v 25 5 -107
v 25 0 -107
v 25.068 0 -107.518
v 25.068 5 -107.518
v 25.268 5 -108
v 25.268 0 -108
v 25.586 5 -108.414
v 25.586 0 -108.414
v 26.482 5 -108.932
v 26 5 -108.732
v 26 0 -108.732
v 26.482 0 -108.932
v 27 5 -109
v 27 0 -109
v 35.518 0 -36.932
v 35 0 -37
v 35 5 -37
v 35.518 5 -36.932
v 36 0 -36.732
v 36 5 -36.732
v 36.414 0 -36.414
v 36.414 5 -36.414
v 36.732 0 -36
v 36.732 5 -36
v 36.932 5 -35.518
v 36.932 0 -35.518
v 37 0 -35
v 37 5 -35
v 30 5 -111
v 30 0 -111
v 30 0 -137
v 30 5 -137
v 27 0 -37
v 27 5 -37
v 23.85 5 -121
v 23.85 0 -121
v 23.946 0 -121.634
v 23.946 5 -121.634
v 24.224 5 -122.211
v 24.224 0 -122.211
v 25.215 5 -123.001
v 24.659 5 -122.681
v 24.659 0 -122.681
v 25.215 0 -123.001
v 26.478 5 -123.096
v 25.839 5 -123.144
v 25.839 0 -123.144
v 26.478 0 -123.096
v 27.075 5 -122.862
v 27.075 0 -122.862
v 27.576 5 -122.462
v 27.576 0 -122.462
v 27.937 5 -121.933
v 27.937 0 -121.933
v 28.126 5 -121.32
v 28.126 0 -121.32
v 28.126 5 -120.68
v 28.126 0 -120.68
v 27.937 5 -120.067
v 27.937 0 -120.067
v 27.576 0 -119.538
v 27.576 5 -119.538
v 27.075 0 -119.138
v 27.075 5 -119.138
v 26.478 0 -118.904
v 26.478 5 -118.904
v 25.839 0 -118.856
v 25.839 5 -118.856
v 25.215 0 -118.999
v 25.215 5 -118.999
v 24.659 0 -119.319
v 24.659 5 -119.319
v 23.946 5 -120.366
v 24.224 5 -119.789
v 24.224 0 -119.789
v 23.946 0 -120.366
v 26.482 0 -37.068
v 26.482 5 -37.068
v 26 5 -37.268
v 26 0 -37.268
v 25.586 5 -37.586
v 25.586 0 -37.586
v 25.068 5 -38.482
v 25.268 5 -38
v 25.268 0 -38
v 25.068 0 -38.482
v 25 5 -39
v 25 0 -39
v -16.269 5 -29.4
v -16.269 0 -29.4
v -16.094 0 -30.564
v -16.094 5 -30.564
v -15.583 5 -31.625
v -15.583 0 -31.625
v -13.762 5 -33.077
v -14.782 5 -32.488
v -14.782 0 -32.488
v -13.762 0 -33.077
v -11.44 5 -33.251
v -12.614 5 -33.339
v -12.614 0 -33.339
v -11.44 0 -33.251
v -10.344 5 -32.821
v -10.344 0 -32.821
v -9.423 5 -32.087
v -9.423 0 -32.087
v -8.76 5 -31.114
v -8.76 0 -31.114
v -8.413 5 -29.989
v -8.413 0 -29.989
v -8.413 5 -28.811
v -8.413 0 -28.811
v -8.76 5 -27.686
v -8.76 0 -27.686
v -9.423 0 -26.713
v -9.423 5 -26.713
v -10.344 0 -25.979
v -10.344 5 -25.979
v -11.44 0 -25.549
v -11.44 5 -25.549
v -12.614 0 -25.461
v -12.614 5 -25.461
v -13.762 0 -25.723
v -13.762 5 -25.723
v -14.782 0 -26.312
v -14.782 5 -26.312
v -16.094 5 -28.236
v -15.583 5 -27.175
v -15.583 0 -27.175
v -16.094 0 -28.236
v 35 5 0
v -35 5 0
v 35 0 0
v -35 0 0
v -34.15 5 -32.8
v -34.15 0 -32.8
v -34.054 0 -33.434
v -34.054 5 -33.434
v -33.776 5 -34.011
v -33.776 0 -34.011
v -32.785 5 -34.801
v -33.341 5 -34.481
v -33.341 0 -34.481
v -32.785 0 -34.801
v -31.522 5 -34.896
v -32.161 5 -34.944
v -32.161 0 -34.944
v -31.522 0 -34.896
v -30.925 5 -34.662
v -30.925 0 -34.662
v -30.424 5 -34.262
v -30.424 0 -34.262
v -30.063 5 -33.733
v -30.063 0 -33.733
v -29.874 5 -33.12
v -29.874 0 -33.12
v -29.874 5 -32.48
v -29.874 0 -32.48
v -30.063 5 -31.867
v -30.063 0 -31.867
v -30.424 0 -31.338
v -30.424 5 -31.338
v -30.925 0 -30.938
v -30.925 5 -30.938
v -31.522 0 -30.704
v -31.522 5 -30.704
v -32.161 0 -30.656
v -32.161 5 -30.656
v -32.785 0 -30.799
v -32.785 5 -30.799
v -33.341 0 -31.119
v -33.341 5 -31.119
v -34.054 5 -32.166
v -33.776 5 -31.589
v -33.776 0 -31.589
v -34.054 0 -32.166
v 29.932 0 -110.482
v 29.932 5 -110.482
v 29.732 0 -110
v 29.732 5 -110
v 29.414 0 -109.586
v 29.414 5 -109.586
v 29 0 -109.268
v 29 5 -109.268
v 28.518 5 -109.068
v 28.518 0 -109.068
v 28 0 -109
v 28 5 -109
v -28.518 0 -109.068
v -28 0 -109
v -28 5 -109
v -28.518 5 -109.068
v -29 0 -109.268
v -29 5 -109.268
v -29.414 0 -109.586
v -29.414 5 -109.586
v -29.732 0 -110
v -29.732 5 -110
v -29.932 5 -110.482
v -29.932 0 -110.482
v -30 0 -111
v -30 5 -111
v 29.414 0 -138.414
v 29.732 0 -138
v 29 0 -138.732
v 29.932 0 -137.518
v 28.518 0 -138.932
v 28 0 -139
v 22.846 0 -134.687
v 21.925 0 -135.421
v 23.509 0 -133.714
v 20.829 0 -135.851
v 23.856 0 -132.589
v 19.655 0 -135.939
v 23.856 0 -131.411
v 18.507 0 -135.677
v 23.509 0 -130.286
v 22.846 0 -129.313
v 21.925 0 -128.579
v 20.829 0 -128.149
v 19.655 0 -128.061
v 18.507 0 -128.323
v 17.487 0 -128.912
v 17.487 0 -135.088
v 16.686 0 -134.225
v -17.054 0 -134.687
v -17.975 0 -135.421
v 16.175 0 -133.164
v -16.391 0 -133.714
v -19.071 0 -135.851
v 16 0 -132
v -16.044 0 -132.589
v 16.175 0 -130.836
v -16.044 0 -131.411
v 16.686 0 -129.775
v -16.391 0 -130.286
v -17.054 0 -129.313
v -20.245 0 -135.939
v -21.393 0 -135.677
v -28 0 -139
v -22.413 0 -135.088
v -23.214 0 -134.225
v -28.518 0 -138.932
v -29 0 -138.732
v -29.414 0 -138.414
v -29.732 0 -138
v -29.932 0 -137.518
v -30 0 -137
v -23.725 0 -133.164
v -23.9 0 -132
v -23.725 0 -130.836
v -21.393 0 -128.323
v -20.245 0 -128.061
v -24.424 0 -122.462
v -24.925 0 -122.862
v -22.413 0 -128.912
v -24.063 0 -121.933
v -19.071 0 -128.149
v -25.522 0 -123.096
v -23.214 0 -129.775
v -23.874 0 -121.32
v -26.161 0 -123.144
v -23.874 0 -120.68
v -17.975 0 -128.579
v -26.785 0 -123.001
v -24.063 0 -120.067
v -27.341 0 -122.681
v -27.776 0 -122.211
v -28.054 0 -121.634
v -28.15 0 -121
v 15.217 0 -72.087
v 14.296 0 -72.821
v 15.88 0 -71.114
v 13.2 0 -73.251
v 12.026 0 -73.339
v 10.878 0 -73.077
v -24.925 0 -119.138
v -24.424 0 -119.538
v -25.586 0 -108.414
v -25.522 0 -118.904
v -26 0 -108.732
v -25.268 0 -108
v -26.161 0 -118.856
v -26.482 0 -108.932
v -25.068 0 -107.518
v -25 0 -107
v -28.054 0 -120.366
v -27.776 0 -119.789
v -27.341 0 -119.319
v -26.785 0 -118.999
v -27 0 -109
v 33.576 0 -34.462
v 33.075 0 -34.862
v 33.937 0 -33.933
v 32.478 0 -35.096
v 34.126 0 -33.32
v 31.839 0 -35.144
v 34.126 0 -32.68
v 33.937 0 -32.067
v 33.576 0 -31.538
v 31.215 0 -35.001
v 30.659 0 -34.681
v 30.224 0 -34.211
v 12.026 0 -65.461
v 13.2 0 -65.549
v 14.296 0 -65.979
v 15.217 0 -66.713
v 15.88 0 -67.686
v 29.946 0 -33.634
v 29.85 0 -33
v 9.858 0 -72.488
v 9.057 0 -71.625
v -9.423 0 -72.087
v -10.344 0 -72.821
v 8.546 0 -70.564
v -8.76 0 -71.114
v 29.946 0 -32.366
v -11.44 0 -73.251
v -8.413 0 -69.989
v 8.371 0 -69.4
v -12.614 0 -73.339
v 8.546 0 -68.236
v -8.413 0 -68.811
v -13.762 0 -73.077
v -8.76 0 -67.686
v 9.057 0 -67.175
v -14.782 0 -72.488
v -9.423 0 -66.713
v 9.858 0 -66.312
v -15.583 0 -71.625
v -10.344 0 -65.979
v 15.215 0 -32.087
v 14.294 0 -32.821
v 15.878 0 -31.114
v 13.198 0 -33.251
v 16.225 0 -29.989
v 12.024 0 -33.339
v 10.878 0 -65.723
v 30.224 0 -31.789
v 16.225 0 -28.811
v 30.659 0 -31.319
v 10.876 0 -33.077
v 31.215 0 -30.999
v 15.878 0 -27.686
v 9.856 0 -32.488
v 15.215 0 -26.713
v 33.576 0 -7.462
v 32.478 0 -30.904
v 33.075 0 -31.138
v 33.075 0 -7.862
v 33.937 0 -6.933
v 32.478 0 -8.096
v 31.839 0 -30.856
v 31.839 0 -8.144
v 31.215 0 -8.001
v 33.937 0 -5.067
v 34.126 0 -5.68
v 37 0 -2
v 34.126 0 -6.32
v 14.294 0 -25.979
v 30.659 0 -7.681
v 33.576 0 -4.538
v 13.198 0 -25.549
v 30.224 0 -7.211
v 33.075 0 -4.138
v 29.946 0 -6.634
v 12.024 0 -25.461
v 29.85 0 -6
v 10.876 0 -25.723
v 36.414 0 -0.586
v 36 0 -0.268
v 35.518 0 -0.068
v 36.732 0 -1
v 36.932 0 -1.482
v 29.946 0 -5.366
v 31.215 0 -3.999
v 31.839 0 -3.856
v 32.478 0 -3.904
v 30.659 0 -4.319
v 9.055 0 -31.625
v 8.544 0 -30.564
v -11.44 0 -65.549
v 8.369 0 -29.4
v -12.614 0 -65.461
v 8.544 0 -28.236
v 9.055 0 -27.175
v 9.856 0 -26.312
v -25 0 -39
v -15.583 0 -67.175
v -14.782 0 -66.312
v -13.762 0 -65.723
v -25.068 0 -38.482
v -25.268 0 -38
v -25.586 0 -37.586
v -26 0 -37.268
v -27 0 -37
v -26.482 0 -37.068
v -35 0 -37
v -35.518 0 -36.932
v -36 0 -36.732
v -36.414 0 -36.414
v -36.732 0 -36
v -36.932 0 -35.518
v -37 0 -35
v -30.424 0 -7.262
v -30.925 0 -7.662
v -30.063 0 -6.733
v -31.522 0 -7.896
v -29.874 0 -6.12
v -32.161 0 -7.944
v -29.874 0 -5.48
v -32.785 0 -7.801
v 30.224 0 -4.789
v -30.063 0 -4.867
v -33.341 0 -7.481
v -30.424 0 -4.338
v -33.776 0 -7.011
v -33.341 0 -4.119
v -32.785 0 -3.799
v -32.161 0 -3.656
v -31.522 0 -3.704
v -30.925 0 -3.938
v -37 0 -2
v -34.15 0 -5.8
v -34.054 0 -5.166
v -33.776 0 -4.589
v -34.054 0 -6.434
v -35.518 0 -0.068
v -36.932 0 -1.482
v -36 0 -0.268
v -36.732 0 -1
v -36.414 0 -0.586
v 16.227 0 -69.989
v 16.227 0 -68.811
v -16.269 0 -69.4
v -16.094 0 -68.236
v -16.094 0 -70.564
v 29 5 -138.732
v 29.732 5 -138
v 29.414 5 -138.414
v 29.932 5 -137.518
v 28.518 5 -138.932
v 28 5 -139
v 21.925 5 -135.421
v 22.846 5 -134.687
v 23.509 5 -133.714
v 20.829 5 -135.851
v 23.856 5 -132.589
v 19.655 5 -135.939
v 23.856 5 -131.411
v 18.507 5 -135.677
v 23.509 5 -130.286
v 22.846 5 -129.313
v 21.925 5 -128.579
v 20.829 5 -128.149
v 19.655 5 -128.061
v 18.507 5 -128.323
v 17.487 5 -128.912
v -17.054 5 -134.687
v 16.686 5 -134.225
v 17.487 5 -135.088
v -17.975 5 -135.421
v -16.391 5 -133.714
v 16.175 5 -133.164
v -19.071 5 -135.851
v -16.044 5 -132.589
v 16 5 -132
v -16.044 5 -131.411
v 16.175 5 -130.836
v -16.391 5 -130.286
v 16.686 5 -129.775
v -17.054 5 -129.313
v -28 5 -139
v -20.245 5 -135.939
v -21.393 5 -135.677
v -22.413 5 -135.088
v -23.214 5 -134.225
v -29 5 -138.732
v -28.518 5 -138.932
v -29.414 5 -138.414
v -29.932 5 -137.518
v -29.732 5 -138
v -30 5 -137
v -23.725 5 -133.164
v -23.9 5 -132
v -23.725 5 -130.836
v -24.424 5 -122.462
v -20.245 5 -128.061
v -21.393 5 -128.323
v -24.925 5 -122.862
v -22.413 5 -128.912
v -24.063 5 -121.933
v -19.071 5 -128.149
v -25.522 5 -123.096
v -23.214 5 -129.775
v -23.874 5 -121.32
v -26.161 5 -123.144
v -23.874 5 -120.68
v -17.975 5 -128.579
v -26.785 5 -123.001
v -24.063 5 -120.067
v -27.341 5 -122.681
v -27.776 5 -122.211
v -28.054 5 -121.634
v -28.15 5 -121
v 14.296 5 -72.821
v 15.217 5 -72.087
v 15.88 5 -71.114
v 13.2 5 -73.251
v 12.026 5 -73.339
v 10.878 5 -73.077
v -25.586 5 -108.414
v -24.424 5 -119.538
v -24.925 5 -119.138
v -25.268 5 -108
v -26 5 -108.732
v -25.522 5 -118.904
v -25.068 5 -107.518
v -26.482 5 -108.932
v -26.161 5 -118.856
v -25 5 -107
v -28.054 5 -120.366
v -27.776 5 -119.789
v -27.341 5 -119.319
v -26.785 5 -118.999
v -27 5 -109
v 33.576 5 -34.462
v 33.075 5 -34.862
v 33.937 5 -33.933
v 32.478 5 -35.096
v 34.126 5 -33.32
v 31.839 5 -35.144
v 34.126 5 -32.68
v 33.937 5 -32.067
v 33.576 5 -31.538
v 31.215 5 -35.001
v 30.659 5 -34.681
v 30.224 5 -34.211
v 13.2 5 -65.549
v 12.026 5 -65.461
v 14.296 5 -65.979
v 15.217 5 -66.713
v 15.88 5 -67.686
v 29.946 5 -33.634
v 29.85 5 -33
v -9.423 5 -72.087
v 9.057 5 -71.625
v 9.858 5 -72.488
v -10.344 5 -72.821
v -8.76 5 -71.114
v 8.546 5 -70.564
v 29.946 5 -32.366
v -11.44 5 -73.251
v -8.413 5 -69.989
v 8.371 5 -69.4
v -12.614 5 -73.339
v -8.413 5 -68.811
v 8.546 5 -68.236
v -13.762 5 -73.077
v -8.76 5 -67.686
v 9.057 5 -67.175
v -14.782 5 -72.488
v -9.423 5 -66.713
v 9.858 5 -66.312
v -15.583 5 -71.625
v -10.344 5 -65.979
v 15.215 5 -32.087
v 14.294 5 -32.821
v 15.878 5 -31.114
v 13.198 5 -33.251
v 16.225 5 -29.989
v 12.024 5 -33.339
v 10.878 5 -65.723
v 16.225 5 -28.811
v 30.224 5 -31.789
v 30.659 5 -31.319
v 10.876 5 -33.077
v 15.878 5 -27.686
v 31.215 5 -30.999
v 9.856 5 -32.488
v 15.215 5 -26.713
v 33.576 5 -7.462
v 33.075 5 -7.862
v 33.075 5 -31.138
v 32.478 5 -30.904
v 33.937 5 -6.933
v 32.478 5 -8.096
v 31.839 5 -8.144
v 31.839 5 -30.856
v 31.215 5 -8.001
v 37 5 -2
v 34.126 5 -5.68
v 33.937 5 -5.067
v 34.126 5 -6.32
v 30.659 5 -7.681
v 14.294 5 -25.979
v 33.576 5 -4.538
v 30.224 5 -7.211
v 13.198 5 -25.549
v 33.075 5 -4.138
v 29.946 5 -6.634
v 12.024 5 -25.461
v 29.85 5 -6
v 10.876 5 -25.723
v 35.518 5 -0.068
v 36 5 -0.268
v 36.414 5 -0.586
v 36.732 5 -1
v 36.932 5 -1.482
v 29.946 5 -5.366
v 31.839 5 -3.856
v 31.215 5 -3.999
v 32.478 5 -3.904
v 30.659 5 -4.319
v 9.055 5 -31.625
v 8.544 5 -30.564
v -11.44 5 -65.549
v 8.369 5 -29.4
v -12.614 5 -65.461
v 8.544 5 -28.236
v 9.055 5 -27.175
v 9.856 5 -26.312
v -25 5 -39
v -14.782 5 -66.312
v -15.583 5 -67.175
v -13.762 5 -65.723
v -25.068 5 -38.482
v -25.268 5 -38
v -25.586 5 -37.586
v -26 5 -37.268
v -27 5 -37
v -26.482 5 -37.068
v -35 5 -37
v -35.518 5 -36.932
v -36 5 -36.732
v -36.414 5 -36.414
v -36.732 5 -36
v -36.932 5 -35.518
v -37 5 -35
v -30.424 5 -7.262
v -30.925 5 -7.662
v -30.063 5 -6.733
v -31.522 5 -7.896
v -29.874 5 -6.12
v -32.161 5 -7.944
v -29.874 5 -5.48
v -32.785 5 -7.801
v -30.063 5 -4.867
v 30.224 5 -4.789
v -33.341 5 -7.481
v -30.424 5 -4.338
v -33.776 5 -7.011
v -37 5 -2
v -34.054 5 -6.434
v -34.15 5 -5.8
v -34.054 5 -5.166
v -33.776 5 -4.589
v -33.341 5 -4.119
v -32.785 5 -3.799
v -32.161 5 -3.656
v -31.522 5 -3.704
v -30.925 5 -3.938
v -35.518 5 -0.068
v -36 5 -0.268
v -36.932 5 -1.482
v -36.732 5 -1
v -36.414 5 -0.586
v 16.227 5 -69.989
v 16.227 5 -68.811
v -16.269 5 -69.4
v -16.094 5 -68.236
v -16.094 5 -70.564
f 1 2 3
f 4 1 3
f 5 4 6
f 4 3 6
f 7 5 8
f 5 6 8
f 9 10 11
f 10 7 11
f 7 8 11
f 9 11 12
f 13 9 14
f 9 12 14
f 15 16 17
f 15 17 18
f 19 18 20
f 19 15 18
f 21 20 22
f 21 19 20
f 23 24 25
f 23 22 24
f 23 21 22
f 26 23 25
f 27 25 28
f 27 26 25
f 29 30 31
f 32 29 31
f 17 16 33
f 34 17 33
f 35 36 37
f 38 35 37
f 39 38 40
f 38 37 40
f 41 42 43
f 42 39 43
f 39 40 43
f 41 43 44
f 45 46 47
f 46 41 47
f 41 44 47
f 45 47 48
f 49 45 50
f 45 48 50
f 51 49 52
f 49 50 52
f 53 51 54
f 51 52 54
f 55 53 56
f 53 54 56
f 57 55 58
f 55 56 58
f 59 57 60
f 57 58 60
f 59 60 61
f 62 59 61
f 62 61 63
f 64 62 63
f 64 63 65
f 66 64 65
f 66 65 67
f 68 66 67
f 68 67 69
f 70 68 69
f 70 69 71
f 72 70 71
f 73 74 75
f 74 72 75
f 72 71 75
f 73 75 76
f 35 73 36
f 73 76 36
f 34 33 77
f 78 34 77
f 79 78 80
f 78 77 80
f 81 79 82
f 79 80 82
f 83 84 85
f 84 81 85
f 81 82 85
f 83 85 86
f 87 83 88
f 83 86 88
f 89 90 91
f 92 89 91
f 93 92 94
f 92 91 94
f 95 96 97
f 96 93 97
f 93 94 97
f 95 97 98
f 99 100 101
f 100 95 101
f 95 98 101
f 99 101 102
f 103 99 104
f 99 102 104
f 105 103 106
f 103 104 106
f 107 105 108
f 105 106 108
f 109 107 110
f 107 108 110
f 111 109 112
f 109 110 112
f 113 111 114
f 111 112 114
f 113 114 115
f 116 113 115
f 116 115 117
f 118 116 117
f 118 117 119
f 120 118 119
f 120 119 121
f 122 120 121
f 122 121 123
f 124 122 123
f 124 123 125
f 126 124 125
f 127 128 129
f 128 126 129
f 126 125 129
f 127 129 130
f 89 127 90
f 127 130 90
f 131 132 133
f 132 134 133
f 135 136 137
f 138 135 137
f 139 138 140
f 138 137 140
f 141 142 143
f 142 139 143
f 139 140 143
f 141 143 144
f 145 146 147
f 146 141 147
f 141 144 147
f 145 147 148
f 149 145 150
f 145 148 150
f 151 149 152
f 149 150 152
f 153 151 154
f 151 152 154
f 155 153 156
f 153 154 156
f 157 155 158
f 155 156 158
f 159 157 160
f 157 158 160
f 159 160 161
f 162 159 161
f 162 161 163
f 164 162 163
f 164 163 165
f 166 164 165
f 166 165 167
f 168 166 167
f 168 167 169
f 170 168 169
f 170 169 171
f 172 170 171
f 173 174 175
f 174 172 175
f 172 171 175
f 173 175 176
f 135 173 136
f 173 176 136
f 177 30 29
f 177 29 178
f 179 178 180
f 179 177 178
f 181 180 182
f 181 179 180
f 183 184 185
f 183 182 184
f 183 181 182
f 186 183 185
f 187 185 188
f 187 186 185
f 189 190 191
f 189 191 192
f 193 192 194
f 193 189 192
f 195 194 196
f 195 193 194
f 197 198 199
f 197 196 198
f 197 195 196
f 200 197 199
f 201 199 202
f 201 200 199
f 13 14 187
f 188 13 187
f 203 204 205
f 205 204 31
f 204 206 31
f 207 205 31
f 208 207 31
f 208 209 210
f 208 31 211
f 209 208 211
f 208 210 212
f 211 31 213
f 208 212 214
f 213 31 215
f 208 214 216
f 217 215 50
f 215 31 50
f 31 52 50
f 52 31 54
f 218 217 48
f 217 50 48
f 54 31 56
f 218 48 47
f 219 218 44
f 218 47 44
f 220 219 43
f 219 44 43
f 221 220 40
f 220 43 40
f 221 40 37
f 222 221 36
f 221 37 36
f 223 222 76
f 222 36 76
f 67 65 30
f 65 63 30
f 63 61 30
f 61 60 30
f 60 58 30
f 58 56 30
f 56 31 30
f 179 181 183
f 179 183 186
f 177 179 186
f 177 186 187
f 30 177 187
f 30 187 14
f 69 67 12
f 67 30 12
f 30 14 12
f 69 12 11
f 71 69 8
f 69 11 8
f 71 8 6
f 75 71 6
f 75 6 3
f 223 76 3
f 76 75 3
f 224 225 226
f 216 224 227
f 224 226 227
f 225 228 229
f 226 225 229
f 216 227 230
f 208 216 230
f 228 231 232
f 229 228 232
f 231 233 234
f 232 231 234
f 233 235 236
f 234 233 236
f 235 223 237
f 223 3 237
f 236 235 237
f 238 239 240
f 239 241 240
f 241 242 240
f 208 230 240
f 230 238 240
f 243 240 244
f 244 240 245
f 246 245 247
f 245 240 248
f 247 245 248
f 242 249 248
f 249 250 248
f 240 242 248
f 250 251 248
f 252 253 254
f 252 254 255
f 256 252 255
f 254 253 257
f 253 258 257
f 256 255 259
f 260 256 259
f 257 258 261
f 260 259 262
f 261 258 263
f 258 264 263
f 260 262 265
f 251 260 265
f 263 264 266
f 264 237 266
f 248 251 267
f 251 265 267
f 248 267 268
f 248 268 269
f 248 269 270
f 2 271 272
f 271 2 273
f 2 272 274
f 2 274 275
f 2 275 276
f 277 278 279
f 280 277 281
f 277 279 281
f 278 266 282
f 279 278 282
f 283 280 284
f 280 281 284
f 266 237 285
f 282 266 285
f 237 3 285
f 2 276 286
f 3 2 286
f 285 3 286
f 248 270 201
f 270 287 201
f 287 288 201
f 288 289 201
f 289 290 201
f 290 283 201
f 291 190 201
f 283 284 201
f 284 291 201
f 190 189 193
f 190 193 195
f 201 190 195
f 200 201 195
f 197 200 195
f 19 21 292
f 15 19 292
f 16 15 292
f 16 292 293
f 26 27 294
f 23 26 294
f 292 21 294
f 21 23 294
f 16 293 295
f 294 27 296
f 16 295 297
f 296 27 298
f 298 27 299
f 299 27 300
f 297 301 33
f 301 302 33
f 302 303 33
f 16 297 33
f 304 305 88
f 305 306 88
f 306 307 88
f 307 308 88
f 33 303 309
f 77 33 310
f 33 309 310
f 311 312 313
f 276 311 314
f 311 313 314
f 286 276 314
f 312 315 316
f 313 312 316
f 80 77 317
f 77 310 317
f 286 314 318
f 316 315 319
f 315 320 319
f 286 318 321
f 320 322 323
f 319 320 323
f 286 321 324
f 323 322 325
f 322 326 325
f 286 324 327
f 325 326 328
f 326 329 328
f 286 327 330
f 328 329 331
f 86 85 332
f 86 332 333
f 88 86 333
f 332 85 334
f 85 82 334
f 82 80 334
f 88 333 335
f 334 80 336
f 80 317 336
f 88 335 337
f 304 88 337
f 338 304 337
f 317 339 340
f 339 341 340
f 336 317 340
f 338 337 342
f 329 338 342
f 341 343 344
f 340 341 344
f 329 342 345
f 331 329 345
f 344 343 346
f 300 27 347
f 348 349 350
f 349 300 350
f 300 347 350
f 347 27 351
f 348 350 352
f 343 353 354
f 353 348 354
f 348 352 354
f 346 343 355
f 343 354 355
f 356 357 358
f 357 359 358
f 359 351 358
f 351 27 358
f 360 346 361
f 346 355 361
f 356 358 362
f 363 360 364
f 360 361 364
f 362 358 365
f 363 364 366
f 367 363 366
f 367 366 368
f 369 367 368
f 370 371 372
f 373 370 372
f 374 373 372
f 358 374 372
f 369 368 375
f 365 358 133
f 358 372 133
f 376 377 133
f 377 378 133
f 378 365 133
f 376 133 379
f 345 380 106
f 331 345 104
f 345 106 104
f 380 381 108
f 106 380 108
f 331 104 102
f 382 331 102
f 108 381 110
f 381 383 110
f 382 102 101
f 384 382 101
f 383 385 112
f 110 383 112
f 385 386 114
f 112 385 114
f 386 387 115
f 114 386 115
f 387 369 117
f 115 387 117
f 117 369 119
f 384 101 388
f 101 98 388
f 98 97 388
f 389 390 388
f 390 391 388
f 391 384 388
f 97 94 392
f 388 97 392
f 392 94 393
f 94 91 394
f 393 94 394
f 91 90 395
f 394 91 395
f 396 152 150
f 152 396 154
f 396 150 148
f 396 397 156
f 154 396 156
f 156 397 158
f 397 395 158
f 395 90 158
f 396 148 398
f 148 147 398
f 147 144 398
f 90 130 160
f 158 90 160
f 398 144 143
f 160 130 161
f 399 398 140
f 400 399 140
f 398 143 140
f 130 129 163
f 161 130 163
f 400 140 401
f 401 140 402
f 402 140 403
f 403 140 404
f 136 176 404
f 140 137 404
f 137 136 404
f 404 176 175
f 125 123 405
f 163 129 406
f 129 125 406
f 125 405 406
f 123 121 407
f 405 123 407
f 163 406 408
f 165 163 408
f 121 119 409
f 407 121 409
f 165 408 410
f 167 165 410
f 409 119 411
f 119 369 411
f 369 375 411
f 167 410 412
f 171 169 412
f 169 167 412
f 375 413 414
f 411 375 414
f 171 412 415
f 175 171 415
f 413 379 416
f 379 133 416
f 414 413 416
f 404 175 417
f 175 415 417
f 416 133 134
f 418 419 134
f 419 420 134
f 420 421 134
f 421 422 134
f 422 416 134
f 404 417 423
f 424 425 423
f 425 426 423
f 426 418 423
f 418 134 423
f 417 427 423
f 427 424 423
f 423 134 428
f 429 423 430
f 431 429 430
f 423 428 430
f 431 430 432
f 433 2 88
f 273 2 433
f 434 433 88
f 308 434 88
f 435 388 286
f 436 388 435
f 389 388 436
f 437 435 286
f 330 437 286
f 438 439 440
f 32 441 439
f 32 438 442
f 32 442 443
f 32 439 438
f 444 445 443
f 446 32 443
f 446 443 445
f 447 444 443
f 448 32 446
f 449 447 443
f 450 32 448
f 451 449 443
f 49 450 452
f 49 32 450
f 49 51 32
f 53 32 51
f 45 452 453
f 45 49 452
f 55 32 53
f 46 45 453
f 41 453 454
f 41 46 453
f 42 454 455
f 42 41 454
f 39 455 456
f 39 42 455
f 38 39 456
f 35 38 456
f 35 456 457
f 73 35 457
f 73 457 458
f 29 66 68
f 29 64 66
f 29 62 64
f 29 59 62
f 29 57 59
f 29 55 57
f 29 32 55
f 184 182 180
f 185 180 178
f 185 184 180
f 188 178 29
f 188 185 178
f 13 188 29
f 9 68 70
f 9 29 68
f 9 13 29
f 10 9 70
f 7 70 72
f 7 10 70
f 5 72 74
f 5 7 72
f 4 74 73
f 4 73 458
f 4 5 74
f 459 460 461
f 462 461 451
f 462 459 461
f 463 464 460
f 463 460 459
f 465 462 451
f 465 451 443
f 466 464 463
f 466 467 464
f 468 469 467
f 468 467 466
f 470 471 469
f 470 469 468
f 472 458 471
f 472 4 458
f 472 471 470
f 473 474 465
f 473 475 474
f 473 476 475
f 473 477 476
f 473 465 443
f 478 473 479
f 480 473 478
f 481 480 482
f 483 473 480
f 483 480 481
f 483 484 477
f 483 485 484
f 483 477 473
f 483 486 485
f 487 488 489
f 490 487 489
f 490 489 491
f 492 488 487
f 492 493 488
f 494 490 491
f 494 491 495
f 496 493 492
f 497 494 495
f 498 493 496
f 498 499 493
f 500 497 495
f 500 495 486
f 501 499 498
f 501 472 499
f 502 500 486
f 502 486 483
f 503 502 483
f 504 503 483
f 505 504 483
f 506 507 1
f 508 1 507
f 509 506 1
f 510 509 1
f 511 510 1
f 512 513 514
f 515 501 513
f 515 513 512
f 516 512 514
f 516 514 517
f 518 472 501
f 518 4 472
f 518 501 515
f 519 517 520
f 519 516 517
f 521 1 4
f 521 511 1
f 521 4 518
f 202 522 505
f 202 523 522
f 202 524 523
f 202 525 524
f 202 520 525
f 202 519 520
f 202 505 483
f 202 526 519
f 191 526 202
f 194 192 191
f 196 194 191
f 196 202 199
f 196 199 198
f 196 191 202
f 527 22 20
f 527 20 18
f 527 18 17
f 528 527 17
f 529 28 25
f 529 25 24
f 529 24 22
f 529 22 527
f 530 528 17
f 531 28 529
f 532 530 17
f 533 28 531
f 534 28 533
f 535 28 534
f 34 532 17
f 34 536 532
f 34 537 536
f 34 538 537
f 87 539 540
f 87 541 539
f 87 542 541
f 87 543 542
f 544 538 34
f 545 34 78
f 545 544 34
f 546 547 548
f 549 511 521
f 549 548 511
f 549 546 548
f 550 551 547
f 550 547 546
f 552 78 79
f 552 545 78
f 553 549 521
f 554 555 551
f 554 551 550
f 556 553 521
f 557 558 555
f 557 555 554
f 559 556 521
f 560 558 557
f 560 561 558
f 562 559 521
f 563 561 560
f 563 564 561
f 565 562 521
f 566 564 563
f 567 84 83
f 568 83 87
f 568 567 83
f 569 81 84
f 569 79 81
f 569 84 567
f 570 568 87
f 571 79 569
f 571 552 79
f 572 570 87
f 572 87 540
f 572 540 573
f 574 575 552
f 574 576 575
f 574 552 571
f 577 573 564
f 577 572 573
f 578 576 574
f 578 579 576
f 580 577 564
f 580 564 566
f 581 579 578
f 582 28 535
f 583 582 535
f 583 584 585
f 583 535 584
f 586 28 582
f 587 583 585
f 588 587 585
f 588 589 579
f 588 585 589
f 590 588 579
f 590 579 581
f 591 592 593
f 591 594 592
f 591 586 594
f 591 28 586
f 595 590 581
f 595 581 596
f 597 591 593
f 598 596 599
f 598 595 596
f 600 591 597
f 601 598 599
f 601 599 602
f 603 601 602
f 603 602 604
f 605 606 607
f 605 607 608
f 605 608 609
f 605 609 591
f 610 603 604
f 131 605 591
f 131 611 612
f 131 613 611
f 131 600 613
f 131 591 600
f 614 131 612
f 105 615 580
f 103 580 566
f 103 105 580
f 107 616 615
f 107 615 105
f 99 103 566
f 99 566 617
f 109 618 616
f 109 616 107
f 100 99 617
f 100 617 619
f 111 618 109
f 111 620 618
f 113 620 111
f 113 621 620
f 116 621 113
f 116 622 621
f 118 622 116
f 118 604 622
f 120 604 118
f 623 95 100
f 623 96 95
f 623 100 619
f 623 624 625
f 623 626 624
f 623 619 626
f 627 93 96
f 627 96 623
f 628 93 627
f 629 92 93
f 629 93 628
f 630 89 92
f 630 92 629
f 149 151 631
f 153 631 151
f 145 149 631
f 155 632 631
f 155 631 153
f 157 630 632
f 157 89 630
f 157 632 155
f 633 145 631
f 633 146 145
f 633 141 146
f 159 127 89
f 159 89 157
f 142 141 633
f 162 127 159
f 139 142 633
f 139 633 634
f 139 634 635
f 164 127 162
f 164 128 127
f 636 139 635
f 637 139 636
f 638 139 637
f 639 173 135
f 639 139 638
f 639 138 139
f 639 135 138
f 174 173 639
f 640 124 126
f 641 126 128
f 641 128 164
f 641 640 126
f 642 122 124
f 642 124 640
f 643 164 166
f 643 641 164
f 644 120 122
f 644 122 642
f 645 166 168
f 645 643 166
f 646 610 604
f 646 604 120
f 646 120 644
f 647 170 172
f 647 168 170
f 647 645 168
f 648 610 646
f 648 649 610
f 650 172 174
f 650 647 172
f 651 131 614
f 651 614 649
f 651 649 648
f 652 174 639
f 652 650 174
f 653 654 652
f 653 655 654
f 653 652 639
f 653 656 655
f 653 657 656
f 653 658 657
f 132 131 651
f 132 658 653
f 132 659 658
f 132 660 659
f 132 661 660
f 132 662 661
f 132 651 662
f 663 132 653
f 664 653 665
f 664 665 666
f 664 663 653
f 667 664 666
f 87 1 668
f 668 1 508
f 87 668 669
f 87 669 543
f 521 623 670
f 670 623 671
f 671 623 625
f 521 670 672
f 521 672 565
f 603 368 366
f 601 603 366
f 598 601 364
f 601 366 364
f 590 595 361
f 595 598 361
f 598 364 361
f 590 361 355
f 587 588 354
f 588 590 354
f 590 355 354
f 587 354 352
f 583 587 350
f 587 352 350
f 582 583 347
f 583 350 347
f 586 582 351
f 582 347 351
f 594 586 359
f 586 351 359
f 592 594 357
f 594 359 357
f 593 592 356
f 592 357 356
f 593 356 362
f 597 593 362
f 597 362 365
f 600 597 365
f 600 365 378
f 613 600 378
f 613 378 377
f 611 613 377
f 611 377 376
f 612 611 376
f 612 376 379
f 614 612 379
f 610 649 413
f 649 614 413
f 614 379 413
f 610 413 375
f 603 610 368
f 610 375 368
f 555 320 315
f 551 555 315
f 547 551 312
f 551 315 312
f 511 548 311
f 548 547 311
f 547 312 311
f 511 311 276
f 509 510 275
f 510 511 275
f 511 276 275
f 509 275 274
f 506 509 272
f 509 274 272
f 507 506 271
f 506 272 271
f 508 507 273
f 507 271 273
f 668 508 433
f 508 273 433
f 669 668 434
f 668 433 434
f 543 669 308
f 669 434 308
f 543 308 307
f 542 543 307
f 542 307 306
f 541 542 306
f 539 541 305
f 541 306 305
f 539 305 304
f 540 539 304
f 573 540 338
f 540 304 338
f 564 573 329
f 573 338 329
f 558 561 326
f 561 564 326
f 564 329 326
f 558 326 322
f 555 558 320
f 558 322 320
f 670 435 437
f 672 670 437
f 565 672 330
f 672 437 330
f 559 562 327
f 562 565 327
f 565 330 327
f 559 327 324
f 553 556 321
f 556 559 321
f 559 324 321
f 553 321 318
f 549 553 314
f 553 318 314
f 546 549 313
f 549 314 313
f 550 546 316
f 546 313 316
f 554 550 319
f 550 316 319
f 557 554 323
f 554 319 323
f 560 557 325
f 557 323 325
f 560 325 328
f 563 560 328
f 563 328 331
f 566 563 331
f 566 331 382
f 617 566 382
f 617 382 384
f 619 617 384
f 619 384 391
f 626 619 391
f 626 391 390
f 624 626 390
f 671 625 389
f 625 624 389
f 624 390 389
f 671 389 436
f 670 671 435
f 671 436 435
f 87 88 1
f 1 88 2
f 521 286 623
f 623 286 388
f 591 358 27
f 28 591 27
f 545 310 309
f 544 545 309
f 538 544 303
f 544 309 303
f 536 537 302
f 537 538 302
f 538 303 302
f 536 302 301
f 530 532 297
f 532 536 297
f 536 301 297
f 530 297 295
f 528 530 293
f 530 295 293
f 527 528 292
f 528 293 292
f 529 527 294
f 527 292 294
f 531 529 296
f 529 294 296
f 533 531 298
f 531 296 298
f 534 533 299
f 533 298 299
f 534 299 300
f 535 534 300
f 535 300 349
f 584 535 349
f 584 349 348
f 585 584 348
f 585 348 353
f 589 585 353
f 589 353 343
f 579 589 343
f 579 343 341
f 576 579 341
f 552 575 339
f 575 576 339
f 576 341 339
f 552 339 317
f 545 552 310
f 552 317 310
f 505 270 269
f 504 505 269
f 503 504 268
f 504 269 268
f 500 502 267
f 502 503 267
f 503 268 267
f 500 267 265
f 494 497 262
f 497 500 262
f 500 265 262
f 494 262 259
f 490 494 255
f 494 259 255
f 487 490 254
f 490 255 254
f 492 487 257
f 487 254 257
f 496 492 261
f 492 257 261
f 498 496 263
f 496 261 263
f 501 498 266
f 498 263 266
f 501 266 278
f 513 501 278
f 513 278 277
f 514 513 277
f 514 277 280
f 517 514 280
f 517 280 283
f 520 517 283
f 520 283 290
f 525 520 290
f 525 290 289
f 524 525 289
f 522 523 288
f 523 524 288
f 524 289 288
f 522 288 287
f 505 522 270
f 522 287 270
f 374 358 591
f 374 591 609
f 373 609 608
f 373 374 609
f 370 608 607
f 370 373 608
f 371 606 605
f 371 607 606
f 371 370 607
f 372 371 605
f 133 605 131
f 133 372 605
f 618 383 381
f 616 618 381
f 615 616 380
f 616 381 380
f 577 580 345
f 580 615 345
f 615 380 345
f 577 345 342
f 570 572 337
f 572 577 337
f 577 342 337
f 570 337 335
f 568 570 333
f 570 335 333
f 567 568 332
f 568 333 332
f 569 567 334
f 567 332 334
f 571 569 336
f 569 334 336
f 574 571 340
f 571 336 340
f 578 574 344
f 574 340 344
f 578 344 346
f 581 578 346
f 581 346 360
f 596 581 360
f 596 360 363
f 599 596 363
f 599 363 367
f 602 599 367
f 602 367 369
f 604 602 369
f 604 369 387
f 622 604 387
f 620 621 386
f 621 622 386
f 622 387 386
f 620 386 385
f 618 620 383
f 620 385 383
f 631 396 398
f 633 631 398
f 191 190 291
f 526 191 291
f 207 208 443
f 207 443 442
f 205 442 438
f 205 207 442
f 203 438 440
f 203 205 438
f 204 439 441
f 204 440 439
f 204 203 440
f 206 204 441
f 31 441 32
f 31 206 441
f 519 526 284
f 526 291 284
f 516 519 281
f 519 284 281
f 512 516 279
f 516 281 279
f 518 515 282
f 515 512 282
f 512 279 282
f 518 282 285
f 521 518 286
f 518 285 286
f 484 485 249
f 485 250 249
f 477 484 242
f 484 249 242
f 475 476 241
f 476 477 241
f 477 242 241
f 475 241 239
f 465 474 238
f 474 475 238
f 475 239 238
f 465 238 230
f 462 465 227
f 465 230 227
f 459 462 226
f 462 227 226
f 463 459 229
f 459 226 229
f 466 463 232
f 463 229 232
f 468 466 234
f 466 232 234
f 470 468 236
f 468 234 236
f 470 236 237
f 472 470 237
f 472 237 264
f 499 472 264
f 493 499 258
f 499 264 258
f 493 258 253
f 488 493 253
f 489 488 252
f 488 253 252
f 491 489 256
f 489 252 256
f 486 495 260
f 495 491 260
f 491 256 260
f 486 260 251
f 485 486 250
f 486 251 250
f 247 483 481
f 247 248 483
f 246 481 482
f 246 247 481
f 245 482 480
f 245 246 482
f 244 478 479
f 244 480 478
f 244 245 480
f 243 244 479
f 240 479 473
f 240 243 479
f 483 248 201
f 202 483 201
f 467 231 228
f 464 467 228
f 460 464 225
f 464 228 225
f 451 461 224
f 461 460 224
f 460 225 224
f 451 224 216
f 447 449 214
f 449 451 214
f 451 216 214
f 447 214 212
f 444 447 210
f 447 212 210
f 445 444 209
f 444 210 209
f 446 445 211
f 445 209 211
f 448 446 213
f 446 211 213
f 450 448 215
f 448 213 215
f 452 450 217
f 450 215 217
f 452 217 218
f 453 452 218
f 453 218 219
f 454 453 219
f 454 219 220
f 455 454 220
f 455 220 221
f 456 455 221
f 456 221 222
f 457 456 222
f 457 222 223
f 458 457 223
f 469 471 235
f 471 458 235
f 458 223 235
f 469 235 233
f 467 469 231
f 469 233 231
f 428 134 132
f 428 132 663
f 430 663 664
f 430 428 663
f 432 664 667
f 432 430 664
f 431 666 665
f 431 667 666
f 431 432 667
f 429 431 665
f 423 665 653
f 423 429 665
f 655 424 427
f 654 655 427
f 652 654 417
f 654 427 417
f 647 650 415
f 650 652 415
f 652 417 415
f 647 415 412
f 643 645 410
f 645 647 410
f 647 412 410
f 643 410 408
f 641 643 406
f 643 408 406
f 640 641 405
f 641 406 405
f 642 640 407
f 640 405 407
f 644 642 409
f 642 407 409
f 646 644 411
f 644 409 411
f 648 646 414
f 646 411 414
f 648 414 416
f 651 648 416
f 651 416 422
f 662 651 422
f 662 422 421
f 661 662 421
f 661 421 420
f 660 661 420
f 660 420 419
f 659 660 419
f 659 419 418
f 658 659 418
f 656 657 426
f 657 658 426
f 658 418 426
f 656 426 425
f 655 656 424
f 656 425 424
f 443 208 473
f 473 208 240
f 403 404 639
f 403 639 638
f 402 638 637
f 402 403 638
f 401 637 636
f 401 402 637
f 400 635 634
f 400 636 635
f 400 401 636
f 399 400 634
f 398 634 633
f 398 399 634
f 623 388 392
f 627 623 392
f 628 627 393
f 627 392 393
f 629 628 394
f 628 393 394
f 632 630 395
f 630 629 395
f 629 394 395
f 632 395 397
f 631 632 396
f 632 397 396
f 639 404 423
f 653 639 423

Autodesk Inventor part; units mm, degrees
ref_plane "YZ Plane" through (0, 0, 0) normal (1, 0, 0) x (0, 1, 0)
ref_plane "XZ Plane" through (0, 0, 0) normal (0, 1, 0) x (-1, 0, 0)
ref_plane "XY Plane" through (0, 0, 0) normal (0, 0, 1) x (1, 0, 0)
sketch "Sketch2" plane through (0, 0, 0) normal (0, 1, 0) x (-1, 0, 0)
  line L0 (35, 0) -> (-35, 0)
  line L1 (-37, -2) -> (-37, -35)
  line L2 (-35, -37) -> (-27, -37)
  line L3 (-25, -39) -> (-25, -107)
  line L4 (-27, -109) -> (-28, -109)
  line L5 (-30, -111) -> (-30, -137)
  line L6 (-28, -139) -> (28, -139)
  line L7 (30, -137) -> (30, -111)
  line L8 (28, -109) -> (27, -109)
  line L9 (25, -107) -> (25, -39)
  line L10 (27, -37) -> (35, -37)
  line L11 (37, -35) -> (37, -2)
  circle A0 centre (19.95, -132) radius 3.95
  circle A1 centre (-19.95, -132) radius 3.95
  circle A2 centre (26, -121) radius 2.15
  circle A3 centre (-26, -121) radius 2.15
  circle A4 centre (12.319, -69.4) radius 3.95
  circle A5 centre (-12.321, -69.4) radius 3.95
  circle A6 centre (12.319, -29.4) radius 3.95
  circle A7 centre (-12.319, -29.4) radius 3.95
  circle A8 centre (32, -32.8) radius 2.15
  circle A9 centre (32, -5.8) radius 2.15
  circle A10 centre (-32, -33) radius 2.15
  circle A11 centre (-32, -6) radius 2.15
  arc A12 (25, -107) -> (27, -109) centre (27, -107) ccw
  arc A13 (30, -111) -> (28, -109) centre (28, -111) ccw
  arc A14 (27, -37) -> (25, -39) centre (27, -39) ccw
  arc A15 (35, -37) -> (37, -35) centre (35, -35) ccw
  arc A16 (37, -2) -> (35, 0) centre (35, -2) ccw
  arc A17 (-35, 0) -> (-37, -2) centre (-35, -2) ccw
  arc A18 (-37, -35) -> (-35, -37) centre (-35, -35) ccw
  arc A19 (-25, -39) -> (-27, -37) centre (-27, -39) ccw
  arc A20 (-27, -109) -> (-25, -107) centre (-27, -107) ccw
  arc A21 (-28, -109) -> (-30, -111) centre (-28, -111) ccw
  arc A22 (-30, -137) -> (-28, -139) centre (-28, -137) ccw
  arc A23 (28, -139) -> (30, -137) centre (28, -137) ccw
  point P0 (0, 0)
  point P1 (37, 0)
  point P2 (-37, 0)
  point P3 (-37, -37)
  point P4 (-25, -37)
  point P5 (-25, -109)
  point P6 (-30, -109)
  point P7 (-30, -139)
  point P8 (30, -139)
  point P9 (30, -109)
  point P10 (25, -109)
  point P11 (25, -37)
  point P12 (37, -37)
  dimension "d71" = 74
  dimension "d72" = 37
  dimension "d73" = 12
  dimension "d74" = 72
  dimension "d76" = 30
  dimension "d77" = 60
  dimension "d78" = 30
  dimension "d79" = 5
  dimension "d80" = 72
  dimension "d81" = 12
  dimension "d82" = 7.9
  dimension "d83" = 7.9
  dimension "d84" = 39.9
  dimension "d85" = 7
  dimension "d86" = 7
  dimension "d87" = 37
  dimension "d88" = 4.3
  dimension "d89" = 11
  dimension "d90" = 4
  dimension "d91" = 4.3
  dimension "d92" = 5
  dimension "d93" = 11
  dimension "d94" = 4
  dimension "d95" = 52
  dimension "d96" = 7.9
  dimension "d97" = 7.9
  dimension "d98" = 7.9
  dimension "d99" = 7.9
  dimension "d100" = 24.64
  dimension "d101" = 24.638
  dimension "d102" = 12.319
  dimension "d103" = 12.319
  dimension "d104" = 40
  dimension "d105" = 29.4
  dimension "d108" = 19.95
  dimension "d109" = 4.3
  dimension "d110" = 4.3
  dimension "d111" = 4.3
  dimension "d112" = 4.3
  dimension "d113" = 27
  dimension "d114" = 27
  dimension "d115" = 5
  dimension "d116" = 5
  dimension "d117" = 6
  dimension "d118" = 5.8
  dimension "d121" = 37
  dimension "d122" = 2
  dimension "d123" = 5
  dimension "d124" = 5
  dimension "d125" = 30
extrude "Extrusion3" add sketch "Sketch2" along normal blind 5
equation "\"d72\" = d121"
equation "\"d78\" = d76"
properties part number "BottomSupport"
